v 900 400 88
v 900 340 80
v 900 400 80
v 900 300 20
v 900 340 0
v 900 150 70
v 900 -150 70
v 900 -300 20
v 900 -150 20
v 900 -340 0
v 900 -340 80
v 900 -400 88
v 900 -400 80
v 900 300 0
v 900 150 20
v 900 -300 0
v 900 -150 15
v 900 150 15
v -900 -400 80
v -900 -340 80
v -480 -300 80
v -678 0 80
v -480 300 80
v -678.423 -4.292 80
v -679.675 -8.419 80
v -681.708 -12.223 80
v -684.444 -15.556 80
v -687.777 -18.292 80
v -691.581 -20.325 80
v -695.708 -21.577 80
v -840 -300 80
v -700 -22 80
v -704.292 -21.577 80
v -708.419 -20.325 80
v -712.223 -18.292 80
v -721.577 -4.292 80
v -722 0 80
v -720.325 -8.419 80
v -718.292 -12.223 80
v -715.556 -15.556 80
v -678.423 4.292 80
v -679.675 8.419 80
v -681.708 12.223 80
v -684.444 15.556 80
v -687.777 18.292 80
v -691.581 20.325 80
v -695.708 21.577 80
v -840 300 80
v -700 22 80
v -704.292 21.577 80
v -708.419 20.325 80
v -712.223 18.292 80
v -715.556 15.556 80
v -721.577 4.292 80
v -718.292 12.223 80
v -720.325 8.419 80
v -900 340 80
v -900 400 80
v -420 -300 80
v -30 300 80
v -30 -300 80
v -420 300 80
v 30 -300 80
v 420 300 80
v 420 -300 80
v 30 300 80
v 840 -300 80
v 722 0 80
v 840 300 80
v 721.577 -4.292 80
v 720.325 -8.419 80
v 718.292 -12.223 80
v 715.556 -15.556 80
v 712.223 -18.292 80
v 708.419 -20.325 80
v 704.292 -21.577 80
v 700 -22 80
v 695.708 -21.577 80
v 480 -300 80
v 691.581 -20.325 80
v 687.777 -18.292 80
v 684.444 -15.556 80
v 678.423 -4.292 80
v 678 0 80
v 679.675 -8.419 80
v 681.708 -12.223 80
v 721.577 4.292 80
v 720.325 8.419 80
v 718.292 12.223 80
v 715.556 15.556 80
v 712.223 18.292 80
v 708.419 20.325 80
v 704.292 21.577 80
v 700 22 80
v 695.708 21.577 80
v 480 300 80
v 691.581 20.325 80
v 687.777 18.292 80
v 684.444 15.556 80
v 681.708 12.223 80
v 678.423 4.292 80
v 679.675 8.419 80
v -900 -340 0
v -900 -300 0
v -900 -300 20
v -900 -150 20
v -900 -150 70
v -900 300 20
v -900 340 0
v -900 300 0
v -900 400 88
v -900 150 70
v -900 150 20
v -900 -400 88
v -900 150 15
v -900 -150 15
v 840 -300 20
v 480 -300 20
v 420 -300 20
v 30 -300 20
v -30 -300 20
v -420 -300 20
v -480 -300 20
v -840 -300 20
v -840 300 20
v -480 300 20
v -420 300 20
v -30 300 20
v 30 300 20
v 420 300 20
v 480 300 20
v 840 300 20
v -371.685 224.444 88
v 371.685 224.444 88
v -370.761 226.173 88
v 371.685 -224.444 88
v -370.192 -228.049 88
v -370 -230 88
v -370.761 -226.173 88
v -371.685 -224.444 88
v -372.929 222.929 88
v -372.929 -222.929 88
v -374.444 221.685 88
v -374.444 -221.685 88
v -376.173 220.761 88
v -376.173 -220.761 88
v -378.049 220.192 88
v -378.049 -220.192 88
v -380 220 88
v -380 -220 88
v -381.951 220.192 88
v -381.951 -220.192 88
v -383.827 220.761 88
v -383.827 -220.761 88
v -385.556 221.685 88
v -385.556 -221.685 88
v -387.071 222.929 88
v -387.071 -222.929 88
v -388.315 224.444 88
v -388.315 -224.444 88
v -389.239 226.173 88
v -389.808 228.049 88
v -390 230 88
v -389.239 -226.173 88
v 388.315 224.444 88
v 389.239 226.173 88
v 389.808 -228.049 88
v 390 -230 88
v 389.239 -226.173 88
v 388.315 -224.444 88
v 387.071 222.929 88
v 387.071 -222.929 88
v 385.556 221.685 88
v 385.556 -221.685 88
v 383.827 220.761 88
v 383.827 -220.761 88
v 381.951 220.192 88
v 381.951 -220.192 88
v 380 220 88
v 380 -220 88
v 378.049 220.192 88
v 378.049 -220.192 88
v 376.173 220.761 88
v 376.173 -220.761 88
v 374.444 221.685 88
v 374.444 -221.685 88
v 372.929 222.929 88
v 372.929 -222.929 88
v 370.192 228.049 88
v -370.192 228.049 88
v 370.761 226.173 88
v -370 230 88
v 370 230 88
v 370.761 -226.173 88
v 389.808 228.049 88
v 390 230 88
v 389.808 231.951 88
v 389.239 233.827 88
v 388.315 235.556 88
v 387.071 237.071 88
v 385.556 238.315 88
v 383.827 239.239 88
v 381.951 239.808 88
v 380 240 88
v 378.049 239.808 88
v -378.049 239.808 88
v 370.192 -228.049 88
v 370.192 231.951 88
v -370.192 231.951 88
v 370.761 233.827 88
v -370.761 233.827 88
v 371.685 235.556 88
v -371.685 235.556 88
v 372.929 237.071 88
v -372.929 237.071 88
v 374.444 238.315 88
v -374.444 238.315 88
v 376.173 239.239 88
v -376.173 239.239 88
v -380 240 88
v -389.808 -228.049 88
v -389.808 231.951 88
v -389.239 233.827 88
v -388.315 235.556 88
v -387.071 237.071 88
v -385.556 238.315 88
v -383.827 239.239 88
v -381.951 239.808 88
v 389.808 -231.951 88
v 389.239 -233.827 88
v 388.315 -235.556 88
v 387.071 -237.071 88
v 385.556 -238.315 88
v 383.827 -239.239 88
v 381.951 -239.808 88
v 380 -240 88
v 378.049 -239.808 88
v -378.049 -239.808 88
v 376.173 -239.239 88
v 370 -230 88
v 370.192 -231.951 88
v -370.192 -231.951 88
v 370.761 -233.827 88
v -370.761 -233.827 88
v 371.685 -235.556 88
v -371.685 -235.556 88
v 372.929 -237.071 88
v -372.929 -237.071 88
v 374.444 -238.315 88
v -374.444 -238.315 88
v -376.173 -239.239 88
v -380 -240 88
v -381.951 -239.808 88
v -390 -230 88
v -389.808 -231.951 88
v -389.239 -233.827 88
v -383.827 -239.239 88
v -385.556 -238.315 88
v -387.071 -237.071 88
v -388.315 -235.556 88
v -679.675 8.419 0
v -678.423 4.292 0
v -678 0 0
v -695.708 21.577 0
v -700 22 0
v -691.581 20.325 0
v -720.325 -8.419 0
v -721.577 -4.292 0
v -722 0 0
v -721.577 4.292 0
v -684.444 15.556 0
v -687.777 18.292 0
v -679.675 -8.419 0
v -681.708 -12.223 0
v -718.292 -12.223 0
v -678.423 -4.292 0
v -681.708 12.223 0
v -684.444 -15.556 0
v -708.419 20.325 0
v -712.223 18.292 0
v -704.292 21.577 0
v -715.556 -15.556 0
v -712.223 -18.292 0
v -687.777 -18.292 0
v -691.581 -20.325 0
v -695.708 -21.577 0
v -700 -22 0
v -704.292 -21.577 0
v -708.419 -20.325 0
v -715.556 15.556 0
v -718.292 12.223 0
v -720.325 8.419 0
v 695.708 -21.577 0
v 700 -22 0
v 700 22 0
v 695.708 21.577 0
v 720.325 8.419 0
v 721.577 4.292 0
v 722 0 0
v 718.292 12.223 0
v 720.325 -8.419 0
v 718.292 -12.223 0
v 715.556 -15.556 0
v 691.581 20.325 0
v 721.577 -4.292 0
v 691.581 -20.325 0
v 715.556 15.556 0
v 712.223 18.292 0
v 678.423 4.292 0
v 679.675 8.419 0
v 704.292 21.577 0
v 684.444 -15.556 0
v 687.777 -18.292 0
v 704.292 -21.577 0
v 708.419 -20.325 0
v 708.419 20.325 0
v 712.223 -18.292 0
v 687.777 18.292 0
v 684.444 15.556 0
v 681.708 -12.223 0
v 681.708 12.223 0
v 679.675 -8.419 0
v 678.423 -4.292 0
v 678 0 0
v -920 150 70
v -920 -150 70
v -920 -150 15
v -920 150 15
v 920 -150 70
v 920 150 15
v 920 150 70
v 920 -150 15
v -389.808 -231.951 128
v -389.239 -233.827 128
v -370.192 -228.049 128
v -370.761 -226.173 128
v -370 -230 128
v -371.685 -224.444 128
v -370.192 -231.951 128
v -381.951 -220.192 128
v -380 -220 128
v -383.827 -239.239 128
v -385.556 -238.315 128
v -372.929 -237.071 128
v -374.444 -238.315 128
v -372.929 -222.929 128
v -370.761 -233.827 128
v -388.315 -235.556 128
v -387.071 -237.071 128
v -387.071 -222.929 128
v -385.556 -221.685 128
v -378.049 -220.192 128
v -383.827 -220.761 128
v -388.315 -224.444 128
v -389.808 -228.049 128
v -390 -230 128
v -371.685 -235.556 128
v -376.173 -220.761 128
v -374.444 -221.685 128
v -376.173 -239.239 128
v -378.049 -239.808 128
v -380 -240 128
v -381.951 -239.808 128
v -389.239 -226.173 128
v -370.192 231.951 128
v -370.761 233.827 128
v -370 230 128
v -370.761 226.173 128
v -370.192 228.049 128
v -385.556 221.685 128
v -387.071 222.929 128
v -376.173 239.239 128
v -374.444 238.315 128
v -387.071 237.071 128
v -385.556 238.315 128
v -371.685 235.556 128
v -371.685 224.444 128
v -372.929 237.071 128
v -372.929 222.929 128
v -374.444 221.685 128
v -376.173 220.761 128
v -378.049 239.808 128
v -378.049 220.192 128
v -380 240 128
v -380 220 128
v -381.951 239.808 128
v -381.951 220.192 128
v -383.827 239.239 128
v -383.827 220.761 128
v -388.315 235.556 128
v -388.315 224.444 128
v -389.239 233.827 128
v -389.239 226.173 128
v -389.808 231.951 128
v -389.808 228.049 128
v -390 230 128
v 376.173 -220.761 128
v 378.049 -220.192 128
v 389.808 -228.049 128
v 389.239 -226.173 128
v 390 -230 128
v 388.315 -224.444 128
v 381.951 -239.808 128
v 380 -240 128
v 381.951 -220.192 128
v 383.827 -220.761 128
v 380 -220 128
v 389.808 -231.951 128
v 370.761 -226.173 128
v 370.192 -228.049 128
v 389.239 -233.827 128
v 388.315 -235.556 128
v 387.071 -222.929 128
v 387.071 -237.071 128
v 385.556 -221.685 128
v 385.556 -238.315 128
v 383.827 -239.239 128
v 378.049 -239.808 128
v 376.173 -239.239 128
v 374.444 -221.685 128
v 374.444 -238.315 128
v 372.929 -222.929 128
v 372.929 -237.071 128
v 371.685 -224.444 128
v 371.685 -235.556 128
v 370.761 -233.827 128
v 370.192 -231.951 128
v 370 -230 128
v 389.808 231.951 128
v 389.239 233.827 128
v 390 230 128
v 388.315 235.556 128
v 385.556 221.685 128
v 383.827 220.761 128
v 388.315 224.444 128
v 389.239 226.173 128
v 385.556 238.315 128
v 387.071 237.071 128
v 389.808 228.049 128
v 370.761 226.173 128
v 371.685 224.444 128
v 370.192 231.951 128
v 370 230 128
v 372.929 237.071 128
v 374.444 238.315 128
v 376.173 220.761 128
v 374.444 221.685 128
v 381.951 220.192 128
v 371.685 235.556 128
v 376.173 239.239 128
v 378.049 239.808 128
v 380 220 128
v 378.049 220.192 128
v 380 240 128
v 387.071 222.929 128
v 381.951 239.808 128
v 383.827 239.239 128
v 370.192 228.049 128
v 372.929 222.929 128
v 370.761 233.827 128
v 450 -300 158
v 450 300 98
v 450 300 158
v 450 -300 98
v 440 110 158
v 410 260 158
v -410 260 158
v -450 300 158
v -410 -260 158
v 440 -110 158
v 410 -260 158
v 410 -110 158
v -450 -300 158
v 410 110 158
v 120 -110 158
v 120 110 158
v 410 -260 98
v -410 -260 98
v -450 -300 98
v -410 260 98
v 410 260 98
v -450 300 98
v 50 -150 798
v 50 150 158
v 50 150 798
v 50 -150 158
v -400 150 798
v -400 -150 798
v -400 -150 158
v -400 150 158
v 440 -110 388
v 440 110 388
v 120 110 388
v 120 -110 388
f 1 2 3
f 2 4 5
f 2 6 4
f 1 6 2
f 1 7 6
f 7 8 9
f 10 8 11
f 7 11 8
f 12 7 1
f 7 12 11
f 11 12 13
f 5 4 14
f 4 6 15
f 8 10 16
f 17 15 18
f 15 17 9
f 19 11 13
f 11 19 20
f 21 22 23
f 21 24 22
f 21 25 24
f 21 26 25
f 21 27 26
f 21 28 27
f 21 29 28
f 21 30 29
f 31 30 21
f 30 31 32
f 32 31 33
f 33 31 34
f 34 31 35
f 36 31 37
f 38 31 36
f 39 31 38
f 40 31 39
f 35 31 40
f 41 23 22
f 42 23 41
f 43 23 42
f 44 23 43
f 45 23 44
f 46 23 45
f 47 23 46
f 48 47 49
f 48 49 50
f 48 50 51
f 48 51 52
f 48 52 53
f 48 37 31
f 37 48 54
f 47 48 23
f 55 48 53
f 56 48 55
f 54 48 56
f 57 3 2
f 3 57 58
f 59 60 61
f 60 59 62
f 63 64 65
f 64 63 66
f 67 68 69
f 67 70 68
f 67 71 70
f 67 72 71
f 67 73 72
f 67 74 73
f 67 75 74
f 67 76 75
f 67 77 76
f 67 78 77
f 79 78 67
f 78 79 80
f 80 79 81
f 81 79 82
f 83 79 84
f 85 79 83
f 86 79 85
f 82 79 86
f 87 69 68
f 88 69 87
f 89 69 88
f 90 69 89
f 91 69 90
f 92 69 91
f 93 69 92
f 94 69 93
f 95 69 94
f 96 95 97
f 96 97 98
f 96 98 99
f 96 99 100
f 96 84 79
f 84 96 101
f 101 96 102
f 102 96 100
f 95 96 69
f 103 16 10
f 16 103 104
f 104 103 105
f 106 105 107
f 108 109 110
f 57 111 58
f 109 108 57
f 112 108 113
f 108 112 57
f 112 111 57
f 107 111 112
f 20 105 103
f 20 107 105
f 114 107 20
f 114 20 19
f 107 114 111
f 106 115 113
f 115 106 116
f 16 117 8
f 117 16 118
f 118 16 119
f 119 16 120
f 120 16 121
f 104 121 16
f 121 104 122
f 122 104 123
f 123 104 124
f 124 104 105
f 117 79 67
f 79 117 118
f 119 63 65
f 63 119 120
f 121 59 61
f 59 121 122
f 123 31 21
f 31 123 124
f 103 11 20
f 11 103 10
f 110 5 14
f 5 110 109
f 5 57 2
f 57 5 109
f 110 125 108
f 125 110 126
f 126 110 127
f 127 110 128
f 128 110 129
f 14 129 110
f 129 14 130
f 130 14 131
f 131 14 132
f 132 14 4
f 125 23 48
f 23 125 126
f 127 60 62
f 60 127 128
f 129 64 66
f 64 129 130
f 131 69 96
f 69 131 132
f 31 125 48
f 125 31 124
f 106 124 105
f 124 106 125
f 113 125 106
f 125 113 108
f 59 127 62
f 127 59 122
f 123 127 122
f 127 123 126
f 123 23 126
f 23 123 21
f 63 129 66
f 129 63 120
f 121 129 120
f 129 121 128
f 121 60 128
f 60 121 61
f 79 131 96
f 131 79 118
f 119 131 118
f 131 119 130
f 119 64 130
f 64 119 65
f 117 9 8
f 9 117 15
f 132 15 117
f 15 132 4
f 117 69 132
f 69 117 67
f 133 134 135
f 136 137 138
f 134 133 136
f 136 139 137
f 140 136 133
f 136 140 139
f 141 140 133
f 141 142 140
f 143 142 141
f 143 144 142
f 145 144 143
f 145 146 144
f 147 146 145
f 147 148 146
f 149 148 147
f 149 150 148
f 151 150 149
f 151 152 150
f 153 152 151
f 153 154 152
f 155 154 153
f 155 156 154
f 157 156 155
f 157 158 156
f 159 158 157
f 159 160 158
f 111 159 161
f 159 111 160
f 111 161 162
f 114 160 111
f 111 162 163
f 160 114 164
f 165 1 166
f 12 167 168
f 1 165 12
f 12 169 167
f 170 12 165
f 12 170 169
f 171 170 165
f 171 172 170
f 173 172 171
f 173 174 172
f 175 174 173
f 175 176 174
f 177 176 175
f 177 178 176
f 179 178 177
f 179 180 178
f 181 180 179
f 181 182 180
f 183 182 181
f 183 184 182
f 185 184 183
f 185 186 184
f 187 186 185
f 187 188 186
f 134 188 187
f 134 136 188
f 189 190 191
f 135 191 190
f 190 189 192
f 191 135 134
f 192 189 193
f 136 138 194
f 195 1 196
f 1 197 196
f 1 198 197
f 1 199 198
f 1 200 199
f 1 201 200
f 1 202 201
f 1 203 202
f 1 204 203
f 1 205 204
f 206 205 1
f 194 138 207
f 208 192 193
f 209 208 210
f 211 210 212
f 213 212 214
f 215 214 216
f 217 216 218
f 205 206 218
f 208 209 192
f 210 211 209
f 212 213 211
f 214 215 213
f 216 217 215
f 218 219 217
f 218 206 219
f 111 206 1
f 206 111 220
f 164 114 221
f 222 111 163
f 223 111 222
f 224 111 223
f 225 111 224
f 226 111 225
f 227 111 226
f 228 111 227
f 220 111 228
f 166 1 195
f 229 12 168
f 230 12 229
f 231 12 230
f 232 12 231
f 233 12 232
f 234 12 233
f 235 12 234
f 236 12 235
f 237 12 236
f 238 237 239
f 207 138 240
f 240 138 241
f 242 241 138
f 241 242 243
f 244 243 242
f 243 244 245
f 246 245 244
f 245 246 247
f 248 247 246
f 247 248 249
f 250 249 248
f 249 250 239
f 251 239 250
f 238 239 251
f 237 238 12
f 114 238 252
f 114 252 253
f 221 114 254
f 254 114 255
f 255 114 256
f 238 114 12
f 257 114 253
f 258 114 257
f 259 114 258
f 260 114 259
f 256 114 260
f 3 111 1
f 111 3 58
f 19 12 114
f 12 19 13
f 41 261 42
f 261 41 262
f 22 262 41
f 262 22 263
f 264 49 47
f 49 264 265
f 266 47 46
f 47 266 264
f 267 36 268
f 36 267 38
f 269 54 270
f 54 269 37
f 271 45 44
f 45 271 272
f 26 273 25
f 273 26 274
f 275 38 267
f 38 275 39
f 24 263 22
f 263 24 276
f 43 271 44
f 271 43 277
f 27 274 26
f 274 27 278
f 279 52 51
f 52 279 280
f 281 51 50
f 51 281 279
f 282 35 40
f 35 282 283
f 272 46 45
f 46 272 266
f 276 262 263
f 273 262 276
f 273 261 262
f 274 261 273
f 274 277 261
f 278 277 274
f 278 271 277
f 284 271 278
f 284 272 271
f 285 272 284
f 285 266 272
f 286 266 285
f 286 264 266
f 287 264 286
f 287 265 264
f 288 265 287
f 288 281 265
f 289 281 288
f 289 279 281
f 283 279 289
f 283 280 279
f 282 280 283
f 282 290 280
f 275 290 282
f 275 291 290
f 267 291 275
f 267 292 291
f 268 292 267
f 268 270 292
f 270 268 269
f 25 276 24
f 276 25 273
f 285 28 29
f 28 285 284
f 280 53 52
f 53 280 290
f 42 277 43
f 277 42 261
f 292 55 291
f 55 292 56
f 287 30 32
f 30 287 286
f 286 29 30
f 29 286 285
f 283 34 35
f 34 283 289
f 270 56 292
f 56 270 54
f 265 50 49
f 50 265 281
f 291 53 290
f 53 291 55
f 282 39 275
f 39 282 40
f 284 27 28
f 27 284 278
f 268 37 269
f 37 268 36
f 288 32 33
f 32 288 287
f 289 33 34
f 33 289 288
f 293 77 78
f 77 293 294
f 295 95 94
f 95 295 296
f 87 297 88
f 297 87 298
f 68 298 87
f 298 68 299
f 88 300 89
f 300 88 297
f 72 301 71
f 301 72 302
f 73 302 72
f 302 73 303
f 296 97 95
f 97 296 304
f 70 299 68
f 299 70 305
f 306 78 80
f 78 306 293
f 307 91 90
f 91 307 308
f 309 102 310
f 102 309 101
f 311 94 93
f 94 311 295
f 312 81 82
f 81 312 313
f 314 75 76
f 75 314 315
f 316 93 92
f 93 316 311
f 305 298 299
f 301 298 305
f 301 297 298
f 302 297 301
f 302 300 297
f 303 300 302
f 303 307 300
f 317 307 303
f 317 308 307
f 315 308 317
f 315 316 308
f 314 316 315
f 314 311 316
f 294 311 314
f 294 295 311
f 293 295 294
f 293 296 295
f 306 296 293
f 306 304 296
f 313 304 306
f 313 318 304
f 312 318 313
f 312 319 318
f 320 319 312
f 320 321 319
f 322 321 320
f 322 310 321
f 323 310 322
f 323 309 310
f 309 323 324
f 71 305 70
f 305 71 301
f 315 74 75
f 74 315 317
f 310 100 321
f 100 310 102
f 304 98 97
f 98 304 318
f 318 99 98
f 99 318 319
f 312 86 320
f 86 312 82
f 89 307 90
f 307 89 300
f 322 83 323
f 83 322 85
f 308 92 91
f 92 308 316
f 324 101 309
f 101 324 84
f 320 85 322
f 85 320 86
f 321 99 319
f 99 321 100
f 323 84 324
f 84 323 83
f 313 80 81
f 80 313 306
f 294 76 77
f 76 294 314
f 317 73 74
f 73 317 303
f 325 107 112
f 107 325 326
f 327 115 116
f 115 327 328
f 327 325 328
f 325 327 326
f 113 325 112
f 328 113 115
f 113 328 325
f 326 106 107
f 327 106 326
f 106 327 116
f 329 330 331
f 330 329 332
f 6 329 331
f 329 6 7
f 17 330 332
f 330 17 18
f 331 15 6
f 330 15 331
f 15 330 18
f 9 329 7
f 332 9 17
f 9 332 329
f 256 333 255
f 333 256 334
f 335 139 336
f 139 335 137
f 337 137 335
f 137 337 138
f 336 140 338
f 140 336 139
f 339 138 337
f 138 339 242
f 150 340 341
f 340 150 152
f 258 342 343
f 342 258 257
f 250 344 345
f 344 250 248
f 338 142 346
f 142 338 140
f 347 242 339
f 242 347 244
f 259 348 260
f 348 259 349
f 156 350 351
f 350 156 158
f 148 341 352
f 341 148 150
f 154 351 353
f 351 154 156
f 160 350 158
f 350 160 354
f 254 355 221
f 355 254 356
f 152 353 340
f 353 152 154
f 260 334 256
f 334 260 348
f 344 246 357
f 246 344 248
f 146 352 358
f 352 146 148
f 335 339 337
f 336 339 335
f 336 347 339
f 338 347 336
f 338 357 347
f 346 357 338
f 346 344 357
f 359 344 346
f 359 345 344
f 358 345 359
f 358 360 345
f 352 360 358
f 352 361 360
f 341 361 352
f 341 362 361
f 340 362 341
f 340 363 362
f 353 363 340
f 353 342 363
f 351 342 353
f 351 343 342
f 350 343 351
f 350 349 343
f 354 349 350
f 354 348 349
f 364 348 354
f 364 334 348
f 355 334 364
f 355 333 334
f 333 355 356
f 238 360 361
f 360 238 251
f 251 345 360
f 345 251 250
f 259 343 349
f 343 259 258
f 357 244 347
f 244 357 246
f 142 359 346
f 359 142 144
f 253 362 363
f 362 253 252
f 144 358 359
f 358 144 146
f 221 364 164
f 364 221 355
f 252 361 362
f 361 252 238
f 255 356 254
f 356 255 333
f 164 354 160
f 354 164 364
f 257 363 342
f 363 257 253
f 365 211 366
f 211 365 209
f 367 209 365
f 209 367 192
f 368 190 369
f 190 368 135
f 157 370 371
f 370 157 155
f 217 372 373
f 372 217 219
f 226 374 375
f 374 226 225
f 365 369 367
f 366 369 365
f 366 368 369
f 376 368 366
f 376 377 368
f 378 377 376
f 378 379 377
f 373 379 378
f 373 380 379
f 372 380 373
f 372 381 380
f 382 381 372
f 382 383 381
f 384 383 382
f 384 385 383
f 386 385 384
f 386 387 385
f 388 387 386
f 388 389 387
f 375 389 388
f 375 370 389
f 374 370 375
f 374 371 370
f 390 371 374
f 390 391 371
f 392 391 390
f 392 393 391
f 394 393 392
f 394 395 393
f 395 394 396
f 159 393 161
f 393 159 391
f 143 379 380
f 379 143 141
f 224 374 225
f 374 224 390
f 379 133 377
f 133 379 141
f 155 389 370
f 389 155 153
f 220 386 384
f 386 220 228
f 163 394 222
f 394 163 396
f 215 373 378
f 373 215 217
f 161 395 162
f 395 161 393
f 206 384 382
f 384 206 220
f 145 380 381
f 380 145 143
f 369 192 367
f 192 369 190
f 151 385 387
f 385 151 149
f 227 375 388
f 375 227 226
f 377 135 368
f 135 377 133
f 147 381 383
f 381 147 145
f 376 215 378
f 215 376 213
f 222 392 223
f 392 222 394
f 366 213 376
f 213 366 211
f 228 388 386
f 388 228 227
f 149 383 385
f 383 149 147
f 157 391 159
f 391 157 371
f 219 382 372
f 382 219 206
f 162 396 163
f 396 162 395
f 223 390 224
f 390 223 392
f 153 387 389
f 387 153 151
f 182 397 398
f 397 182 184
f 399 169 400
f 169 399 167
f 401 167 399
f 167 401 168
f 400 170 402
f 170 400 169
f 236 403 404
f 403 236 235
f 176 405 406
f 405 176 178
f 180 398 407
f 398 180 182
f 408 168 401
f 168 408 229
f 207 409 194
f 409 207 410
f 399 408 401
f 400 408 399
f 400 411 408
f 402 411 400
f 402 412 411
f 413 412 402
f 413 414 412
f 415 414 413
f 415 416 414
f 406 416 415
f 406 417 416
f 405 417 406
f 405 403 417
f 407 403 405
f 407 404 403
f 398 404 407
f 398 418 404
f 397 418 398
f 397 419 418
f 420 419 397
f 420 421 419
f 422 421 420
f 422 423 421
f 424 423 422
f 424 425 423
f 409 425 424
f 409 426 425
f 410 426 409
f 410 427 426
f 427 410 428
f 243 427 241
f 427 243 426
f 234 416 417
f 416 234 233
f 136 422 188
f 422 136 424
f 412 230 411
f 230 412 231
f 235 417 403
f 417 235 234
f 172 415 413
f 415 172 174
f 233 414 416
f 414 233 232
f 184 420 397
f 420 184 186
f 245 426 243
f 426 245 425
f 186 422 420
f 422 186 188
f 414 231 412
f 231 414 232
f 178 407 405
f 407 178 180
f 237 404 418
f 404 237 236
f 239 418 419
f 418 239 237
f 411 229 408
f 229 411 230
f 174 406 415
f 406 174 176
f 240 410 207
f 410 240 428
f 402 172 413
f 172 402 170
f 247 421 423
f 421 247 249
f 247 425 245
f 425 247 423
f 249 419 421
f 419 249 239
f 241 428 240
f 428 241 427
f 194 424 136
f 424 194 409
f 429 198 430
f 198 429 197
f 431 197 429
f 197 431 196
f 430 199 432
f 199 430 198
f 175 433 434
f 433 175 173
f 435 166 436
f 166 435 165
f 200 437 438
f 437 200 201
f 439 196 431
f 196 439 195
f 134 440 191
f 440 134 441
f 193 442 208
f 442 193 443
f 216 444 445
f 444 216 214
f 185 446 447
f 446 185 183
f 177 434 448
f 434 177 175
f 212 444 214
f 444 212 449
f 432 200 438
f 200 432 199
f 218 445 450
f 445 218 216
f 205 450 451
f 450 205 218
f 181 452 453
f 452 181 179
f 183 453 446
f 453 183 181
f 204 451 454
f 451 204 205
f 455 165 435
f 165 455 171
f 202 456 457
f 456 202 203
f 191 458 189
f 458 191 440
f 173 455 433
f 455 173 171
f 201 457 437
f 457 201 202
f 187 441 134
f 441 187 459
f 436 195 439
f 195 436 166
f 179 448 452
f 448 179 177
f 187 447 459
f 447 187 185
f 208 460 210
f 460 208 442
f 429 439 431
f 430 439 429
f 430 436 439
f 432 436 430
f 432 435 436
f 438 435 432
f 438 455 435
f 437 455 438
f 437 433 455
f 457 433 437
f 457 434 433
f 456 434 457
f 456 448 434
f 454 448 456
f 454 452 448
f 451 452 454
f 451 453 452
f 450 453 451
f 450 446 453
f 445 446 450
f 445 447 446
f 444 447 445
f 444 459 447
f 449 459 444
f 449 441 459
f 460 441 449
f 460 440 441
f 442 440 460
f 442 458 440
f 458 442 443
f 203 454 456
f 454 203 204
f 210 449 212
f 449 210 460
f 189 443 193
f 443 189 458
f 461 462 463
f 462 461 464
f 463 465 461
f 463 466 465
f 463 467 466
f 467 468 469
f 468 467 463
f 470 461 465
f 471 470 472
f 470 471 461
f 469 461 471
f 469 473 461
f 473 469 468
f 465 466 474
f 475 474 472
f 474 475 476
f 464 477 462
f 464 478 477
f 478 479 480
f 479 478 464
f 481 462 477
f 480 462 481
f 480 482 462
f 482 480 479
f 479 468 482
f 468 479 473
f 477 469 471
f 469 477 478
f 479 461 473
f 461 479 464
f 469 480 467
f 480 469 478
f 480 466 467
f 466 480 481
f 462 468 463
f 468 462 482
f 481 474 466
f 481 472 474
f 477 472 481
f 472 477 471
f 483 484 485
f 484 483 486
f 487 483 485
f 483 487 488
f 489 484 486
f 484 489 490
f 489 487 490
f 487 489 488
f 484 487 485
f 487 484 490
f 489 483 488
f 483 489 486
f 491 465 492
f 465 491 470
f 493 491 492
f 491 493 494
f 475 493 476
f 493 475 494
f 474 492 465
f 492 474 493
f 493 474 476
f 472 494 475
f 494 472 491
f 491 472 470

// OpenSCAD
// carrier_rb100 - generated by asm_3d.py from out/assembly/assembly_specs.json (F4.4) - units mm
// DESIGN - check and release before manufacture. z up, conveyor top z = 500.

module carrier_rb100() {
  translate([-900.00, -340.00, 0.00]) cube([1800.00, 40.00, 80.00]);
  translate([-900.00, 300.00, 0.00]) cube([1800.00, 40.00, 80.00]);
  translate([-900.00, -300.00, 20.00]) cube([60.00, 600.00, 60.00]);
  translate([-480.00, -300.00, 20.00]) cube([60.00, 600.00, 60.00]);
  translate([-30.00, -300.00, 20.00]) cube([60.00, 600.00, 60.00]);
  translate([420.00, -300.00, 20.00]) cube([60.00, 600.00, 60.00]);
  translate([840.00, -300.00, 20.00]) cube([60.00, 600.00, 60.00]);
  translate([-900.00, -400.00, 80.00]) cube([1800.00, 800.00, 8.00]);
  translate([-700.00, 0.00, 40.00]) rotate([0, 0, 0]) cylinder(r = 22.00, h = 80.00, center = true, $fn = 32);
  translate([700.00, 0.00, 40.00]) rotate([0, 0, 0]) cylinder(r = 22.00, h = 80.00, center = true, $fn = 32);
  translate([-920.00, -150.00, 15.00]) cube([20.00, 300.00, 55.00]);
  translate([900.00, -150.00, 15.00]) cube([20.00, 300.00, 55.00]);
  translate([-380.00, -230.00, 108.00]) rotate([0, 0, 0]) cylinder(r = 10.00, h = 40.00, center = true, $fn = 32);
  translate([-380.00, 230.00, 108.00]) rotate([0, 0, 0]) cylinder(r = 10.00, h = 40.00, center = true, $fn = 32);
  translate([380.00, -230.00, 108.00]) rotate([0, 0, 0]) cylinder(r = 10.00, h = 40.00, center = true, $fn = 32);
  translate([380.00, 230.00, 108.00]) rotate([0, 0, 0]) cylinder(r = 10.00, h = 40.00, center = true, $fn = 32);
  translate([-450.00, -300.00, 98.00]) cube([900.00, 40.00, 60.00]);
  translate([-450.00, -260.00, 98.00]) cube([40.00, 520.00, 60.00]);
  translate([-450.00, 260.00, 98.00]) cube([900.00, 40.00, 60.00]);
  translate([410.00, -260.00, 98.00]) cube([40.00, 520.00, 60.00]);
  translate([-400.00, -150.00, 158.00]) cube([450.00, 300.00, 640.00]);
  translate([120.00, -110.00, 158.00]) cube([320.00, 220.00, 230.00]);
}
carrier_rb100();
